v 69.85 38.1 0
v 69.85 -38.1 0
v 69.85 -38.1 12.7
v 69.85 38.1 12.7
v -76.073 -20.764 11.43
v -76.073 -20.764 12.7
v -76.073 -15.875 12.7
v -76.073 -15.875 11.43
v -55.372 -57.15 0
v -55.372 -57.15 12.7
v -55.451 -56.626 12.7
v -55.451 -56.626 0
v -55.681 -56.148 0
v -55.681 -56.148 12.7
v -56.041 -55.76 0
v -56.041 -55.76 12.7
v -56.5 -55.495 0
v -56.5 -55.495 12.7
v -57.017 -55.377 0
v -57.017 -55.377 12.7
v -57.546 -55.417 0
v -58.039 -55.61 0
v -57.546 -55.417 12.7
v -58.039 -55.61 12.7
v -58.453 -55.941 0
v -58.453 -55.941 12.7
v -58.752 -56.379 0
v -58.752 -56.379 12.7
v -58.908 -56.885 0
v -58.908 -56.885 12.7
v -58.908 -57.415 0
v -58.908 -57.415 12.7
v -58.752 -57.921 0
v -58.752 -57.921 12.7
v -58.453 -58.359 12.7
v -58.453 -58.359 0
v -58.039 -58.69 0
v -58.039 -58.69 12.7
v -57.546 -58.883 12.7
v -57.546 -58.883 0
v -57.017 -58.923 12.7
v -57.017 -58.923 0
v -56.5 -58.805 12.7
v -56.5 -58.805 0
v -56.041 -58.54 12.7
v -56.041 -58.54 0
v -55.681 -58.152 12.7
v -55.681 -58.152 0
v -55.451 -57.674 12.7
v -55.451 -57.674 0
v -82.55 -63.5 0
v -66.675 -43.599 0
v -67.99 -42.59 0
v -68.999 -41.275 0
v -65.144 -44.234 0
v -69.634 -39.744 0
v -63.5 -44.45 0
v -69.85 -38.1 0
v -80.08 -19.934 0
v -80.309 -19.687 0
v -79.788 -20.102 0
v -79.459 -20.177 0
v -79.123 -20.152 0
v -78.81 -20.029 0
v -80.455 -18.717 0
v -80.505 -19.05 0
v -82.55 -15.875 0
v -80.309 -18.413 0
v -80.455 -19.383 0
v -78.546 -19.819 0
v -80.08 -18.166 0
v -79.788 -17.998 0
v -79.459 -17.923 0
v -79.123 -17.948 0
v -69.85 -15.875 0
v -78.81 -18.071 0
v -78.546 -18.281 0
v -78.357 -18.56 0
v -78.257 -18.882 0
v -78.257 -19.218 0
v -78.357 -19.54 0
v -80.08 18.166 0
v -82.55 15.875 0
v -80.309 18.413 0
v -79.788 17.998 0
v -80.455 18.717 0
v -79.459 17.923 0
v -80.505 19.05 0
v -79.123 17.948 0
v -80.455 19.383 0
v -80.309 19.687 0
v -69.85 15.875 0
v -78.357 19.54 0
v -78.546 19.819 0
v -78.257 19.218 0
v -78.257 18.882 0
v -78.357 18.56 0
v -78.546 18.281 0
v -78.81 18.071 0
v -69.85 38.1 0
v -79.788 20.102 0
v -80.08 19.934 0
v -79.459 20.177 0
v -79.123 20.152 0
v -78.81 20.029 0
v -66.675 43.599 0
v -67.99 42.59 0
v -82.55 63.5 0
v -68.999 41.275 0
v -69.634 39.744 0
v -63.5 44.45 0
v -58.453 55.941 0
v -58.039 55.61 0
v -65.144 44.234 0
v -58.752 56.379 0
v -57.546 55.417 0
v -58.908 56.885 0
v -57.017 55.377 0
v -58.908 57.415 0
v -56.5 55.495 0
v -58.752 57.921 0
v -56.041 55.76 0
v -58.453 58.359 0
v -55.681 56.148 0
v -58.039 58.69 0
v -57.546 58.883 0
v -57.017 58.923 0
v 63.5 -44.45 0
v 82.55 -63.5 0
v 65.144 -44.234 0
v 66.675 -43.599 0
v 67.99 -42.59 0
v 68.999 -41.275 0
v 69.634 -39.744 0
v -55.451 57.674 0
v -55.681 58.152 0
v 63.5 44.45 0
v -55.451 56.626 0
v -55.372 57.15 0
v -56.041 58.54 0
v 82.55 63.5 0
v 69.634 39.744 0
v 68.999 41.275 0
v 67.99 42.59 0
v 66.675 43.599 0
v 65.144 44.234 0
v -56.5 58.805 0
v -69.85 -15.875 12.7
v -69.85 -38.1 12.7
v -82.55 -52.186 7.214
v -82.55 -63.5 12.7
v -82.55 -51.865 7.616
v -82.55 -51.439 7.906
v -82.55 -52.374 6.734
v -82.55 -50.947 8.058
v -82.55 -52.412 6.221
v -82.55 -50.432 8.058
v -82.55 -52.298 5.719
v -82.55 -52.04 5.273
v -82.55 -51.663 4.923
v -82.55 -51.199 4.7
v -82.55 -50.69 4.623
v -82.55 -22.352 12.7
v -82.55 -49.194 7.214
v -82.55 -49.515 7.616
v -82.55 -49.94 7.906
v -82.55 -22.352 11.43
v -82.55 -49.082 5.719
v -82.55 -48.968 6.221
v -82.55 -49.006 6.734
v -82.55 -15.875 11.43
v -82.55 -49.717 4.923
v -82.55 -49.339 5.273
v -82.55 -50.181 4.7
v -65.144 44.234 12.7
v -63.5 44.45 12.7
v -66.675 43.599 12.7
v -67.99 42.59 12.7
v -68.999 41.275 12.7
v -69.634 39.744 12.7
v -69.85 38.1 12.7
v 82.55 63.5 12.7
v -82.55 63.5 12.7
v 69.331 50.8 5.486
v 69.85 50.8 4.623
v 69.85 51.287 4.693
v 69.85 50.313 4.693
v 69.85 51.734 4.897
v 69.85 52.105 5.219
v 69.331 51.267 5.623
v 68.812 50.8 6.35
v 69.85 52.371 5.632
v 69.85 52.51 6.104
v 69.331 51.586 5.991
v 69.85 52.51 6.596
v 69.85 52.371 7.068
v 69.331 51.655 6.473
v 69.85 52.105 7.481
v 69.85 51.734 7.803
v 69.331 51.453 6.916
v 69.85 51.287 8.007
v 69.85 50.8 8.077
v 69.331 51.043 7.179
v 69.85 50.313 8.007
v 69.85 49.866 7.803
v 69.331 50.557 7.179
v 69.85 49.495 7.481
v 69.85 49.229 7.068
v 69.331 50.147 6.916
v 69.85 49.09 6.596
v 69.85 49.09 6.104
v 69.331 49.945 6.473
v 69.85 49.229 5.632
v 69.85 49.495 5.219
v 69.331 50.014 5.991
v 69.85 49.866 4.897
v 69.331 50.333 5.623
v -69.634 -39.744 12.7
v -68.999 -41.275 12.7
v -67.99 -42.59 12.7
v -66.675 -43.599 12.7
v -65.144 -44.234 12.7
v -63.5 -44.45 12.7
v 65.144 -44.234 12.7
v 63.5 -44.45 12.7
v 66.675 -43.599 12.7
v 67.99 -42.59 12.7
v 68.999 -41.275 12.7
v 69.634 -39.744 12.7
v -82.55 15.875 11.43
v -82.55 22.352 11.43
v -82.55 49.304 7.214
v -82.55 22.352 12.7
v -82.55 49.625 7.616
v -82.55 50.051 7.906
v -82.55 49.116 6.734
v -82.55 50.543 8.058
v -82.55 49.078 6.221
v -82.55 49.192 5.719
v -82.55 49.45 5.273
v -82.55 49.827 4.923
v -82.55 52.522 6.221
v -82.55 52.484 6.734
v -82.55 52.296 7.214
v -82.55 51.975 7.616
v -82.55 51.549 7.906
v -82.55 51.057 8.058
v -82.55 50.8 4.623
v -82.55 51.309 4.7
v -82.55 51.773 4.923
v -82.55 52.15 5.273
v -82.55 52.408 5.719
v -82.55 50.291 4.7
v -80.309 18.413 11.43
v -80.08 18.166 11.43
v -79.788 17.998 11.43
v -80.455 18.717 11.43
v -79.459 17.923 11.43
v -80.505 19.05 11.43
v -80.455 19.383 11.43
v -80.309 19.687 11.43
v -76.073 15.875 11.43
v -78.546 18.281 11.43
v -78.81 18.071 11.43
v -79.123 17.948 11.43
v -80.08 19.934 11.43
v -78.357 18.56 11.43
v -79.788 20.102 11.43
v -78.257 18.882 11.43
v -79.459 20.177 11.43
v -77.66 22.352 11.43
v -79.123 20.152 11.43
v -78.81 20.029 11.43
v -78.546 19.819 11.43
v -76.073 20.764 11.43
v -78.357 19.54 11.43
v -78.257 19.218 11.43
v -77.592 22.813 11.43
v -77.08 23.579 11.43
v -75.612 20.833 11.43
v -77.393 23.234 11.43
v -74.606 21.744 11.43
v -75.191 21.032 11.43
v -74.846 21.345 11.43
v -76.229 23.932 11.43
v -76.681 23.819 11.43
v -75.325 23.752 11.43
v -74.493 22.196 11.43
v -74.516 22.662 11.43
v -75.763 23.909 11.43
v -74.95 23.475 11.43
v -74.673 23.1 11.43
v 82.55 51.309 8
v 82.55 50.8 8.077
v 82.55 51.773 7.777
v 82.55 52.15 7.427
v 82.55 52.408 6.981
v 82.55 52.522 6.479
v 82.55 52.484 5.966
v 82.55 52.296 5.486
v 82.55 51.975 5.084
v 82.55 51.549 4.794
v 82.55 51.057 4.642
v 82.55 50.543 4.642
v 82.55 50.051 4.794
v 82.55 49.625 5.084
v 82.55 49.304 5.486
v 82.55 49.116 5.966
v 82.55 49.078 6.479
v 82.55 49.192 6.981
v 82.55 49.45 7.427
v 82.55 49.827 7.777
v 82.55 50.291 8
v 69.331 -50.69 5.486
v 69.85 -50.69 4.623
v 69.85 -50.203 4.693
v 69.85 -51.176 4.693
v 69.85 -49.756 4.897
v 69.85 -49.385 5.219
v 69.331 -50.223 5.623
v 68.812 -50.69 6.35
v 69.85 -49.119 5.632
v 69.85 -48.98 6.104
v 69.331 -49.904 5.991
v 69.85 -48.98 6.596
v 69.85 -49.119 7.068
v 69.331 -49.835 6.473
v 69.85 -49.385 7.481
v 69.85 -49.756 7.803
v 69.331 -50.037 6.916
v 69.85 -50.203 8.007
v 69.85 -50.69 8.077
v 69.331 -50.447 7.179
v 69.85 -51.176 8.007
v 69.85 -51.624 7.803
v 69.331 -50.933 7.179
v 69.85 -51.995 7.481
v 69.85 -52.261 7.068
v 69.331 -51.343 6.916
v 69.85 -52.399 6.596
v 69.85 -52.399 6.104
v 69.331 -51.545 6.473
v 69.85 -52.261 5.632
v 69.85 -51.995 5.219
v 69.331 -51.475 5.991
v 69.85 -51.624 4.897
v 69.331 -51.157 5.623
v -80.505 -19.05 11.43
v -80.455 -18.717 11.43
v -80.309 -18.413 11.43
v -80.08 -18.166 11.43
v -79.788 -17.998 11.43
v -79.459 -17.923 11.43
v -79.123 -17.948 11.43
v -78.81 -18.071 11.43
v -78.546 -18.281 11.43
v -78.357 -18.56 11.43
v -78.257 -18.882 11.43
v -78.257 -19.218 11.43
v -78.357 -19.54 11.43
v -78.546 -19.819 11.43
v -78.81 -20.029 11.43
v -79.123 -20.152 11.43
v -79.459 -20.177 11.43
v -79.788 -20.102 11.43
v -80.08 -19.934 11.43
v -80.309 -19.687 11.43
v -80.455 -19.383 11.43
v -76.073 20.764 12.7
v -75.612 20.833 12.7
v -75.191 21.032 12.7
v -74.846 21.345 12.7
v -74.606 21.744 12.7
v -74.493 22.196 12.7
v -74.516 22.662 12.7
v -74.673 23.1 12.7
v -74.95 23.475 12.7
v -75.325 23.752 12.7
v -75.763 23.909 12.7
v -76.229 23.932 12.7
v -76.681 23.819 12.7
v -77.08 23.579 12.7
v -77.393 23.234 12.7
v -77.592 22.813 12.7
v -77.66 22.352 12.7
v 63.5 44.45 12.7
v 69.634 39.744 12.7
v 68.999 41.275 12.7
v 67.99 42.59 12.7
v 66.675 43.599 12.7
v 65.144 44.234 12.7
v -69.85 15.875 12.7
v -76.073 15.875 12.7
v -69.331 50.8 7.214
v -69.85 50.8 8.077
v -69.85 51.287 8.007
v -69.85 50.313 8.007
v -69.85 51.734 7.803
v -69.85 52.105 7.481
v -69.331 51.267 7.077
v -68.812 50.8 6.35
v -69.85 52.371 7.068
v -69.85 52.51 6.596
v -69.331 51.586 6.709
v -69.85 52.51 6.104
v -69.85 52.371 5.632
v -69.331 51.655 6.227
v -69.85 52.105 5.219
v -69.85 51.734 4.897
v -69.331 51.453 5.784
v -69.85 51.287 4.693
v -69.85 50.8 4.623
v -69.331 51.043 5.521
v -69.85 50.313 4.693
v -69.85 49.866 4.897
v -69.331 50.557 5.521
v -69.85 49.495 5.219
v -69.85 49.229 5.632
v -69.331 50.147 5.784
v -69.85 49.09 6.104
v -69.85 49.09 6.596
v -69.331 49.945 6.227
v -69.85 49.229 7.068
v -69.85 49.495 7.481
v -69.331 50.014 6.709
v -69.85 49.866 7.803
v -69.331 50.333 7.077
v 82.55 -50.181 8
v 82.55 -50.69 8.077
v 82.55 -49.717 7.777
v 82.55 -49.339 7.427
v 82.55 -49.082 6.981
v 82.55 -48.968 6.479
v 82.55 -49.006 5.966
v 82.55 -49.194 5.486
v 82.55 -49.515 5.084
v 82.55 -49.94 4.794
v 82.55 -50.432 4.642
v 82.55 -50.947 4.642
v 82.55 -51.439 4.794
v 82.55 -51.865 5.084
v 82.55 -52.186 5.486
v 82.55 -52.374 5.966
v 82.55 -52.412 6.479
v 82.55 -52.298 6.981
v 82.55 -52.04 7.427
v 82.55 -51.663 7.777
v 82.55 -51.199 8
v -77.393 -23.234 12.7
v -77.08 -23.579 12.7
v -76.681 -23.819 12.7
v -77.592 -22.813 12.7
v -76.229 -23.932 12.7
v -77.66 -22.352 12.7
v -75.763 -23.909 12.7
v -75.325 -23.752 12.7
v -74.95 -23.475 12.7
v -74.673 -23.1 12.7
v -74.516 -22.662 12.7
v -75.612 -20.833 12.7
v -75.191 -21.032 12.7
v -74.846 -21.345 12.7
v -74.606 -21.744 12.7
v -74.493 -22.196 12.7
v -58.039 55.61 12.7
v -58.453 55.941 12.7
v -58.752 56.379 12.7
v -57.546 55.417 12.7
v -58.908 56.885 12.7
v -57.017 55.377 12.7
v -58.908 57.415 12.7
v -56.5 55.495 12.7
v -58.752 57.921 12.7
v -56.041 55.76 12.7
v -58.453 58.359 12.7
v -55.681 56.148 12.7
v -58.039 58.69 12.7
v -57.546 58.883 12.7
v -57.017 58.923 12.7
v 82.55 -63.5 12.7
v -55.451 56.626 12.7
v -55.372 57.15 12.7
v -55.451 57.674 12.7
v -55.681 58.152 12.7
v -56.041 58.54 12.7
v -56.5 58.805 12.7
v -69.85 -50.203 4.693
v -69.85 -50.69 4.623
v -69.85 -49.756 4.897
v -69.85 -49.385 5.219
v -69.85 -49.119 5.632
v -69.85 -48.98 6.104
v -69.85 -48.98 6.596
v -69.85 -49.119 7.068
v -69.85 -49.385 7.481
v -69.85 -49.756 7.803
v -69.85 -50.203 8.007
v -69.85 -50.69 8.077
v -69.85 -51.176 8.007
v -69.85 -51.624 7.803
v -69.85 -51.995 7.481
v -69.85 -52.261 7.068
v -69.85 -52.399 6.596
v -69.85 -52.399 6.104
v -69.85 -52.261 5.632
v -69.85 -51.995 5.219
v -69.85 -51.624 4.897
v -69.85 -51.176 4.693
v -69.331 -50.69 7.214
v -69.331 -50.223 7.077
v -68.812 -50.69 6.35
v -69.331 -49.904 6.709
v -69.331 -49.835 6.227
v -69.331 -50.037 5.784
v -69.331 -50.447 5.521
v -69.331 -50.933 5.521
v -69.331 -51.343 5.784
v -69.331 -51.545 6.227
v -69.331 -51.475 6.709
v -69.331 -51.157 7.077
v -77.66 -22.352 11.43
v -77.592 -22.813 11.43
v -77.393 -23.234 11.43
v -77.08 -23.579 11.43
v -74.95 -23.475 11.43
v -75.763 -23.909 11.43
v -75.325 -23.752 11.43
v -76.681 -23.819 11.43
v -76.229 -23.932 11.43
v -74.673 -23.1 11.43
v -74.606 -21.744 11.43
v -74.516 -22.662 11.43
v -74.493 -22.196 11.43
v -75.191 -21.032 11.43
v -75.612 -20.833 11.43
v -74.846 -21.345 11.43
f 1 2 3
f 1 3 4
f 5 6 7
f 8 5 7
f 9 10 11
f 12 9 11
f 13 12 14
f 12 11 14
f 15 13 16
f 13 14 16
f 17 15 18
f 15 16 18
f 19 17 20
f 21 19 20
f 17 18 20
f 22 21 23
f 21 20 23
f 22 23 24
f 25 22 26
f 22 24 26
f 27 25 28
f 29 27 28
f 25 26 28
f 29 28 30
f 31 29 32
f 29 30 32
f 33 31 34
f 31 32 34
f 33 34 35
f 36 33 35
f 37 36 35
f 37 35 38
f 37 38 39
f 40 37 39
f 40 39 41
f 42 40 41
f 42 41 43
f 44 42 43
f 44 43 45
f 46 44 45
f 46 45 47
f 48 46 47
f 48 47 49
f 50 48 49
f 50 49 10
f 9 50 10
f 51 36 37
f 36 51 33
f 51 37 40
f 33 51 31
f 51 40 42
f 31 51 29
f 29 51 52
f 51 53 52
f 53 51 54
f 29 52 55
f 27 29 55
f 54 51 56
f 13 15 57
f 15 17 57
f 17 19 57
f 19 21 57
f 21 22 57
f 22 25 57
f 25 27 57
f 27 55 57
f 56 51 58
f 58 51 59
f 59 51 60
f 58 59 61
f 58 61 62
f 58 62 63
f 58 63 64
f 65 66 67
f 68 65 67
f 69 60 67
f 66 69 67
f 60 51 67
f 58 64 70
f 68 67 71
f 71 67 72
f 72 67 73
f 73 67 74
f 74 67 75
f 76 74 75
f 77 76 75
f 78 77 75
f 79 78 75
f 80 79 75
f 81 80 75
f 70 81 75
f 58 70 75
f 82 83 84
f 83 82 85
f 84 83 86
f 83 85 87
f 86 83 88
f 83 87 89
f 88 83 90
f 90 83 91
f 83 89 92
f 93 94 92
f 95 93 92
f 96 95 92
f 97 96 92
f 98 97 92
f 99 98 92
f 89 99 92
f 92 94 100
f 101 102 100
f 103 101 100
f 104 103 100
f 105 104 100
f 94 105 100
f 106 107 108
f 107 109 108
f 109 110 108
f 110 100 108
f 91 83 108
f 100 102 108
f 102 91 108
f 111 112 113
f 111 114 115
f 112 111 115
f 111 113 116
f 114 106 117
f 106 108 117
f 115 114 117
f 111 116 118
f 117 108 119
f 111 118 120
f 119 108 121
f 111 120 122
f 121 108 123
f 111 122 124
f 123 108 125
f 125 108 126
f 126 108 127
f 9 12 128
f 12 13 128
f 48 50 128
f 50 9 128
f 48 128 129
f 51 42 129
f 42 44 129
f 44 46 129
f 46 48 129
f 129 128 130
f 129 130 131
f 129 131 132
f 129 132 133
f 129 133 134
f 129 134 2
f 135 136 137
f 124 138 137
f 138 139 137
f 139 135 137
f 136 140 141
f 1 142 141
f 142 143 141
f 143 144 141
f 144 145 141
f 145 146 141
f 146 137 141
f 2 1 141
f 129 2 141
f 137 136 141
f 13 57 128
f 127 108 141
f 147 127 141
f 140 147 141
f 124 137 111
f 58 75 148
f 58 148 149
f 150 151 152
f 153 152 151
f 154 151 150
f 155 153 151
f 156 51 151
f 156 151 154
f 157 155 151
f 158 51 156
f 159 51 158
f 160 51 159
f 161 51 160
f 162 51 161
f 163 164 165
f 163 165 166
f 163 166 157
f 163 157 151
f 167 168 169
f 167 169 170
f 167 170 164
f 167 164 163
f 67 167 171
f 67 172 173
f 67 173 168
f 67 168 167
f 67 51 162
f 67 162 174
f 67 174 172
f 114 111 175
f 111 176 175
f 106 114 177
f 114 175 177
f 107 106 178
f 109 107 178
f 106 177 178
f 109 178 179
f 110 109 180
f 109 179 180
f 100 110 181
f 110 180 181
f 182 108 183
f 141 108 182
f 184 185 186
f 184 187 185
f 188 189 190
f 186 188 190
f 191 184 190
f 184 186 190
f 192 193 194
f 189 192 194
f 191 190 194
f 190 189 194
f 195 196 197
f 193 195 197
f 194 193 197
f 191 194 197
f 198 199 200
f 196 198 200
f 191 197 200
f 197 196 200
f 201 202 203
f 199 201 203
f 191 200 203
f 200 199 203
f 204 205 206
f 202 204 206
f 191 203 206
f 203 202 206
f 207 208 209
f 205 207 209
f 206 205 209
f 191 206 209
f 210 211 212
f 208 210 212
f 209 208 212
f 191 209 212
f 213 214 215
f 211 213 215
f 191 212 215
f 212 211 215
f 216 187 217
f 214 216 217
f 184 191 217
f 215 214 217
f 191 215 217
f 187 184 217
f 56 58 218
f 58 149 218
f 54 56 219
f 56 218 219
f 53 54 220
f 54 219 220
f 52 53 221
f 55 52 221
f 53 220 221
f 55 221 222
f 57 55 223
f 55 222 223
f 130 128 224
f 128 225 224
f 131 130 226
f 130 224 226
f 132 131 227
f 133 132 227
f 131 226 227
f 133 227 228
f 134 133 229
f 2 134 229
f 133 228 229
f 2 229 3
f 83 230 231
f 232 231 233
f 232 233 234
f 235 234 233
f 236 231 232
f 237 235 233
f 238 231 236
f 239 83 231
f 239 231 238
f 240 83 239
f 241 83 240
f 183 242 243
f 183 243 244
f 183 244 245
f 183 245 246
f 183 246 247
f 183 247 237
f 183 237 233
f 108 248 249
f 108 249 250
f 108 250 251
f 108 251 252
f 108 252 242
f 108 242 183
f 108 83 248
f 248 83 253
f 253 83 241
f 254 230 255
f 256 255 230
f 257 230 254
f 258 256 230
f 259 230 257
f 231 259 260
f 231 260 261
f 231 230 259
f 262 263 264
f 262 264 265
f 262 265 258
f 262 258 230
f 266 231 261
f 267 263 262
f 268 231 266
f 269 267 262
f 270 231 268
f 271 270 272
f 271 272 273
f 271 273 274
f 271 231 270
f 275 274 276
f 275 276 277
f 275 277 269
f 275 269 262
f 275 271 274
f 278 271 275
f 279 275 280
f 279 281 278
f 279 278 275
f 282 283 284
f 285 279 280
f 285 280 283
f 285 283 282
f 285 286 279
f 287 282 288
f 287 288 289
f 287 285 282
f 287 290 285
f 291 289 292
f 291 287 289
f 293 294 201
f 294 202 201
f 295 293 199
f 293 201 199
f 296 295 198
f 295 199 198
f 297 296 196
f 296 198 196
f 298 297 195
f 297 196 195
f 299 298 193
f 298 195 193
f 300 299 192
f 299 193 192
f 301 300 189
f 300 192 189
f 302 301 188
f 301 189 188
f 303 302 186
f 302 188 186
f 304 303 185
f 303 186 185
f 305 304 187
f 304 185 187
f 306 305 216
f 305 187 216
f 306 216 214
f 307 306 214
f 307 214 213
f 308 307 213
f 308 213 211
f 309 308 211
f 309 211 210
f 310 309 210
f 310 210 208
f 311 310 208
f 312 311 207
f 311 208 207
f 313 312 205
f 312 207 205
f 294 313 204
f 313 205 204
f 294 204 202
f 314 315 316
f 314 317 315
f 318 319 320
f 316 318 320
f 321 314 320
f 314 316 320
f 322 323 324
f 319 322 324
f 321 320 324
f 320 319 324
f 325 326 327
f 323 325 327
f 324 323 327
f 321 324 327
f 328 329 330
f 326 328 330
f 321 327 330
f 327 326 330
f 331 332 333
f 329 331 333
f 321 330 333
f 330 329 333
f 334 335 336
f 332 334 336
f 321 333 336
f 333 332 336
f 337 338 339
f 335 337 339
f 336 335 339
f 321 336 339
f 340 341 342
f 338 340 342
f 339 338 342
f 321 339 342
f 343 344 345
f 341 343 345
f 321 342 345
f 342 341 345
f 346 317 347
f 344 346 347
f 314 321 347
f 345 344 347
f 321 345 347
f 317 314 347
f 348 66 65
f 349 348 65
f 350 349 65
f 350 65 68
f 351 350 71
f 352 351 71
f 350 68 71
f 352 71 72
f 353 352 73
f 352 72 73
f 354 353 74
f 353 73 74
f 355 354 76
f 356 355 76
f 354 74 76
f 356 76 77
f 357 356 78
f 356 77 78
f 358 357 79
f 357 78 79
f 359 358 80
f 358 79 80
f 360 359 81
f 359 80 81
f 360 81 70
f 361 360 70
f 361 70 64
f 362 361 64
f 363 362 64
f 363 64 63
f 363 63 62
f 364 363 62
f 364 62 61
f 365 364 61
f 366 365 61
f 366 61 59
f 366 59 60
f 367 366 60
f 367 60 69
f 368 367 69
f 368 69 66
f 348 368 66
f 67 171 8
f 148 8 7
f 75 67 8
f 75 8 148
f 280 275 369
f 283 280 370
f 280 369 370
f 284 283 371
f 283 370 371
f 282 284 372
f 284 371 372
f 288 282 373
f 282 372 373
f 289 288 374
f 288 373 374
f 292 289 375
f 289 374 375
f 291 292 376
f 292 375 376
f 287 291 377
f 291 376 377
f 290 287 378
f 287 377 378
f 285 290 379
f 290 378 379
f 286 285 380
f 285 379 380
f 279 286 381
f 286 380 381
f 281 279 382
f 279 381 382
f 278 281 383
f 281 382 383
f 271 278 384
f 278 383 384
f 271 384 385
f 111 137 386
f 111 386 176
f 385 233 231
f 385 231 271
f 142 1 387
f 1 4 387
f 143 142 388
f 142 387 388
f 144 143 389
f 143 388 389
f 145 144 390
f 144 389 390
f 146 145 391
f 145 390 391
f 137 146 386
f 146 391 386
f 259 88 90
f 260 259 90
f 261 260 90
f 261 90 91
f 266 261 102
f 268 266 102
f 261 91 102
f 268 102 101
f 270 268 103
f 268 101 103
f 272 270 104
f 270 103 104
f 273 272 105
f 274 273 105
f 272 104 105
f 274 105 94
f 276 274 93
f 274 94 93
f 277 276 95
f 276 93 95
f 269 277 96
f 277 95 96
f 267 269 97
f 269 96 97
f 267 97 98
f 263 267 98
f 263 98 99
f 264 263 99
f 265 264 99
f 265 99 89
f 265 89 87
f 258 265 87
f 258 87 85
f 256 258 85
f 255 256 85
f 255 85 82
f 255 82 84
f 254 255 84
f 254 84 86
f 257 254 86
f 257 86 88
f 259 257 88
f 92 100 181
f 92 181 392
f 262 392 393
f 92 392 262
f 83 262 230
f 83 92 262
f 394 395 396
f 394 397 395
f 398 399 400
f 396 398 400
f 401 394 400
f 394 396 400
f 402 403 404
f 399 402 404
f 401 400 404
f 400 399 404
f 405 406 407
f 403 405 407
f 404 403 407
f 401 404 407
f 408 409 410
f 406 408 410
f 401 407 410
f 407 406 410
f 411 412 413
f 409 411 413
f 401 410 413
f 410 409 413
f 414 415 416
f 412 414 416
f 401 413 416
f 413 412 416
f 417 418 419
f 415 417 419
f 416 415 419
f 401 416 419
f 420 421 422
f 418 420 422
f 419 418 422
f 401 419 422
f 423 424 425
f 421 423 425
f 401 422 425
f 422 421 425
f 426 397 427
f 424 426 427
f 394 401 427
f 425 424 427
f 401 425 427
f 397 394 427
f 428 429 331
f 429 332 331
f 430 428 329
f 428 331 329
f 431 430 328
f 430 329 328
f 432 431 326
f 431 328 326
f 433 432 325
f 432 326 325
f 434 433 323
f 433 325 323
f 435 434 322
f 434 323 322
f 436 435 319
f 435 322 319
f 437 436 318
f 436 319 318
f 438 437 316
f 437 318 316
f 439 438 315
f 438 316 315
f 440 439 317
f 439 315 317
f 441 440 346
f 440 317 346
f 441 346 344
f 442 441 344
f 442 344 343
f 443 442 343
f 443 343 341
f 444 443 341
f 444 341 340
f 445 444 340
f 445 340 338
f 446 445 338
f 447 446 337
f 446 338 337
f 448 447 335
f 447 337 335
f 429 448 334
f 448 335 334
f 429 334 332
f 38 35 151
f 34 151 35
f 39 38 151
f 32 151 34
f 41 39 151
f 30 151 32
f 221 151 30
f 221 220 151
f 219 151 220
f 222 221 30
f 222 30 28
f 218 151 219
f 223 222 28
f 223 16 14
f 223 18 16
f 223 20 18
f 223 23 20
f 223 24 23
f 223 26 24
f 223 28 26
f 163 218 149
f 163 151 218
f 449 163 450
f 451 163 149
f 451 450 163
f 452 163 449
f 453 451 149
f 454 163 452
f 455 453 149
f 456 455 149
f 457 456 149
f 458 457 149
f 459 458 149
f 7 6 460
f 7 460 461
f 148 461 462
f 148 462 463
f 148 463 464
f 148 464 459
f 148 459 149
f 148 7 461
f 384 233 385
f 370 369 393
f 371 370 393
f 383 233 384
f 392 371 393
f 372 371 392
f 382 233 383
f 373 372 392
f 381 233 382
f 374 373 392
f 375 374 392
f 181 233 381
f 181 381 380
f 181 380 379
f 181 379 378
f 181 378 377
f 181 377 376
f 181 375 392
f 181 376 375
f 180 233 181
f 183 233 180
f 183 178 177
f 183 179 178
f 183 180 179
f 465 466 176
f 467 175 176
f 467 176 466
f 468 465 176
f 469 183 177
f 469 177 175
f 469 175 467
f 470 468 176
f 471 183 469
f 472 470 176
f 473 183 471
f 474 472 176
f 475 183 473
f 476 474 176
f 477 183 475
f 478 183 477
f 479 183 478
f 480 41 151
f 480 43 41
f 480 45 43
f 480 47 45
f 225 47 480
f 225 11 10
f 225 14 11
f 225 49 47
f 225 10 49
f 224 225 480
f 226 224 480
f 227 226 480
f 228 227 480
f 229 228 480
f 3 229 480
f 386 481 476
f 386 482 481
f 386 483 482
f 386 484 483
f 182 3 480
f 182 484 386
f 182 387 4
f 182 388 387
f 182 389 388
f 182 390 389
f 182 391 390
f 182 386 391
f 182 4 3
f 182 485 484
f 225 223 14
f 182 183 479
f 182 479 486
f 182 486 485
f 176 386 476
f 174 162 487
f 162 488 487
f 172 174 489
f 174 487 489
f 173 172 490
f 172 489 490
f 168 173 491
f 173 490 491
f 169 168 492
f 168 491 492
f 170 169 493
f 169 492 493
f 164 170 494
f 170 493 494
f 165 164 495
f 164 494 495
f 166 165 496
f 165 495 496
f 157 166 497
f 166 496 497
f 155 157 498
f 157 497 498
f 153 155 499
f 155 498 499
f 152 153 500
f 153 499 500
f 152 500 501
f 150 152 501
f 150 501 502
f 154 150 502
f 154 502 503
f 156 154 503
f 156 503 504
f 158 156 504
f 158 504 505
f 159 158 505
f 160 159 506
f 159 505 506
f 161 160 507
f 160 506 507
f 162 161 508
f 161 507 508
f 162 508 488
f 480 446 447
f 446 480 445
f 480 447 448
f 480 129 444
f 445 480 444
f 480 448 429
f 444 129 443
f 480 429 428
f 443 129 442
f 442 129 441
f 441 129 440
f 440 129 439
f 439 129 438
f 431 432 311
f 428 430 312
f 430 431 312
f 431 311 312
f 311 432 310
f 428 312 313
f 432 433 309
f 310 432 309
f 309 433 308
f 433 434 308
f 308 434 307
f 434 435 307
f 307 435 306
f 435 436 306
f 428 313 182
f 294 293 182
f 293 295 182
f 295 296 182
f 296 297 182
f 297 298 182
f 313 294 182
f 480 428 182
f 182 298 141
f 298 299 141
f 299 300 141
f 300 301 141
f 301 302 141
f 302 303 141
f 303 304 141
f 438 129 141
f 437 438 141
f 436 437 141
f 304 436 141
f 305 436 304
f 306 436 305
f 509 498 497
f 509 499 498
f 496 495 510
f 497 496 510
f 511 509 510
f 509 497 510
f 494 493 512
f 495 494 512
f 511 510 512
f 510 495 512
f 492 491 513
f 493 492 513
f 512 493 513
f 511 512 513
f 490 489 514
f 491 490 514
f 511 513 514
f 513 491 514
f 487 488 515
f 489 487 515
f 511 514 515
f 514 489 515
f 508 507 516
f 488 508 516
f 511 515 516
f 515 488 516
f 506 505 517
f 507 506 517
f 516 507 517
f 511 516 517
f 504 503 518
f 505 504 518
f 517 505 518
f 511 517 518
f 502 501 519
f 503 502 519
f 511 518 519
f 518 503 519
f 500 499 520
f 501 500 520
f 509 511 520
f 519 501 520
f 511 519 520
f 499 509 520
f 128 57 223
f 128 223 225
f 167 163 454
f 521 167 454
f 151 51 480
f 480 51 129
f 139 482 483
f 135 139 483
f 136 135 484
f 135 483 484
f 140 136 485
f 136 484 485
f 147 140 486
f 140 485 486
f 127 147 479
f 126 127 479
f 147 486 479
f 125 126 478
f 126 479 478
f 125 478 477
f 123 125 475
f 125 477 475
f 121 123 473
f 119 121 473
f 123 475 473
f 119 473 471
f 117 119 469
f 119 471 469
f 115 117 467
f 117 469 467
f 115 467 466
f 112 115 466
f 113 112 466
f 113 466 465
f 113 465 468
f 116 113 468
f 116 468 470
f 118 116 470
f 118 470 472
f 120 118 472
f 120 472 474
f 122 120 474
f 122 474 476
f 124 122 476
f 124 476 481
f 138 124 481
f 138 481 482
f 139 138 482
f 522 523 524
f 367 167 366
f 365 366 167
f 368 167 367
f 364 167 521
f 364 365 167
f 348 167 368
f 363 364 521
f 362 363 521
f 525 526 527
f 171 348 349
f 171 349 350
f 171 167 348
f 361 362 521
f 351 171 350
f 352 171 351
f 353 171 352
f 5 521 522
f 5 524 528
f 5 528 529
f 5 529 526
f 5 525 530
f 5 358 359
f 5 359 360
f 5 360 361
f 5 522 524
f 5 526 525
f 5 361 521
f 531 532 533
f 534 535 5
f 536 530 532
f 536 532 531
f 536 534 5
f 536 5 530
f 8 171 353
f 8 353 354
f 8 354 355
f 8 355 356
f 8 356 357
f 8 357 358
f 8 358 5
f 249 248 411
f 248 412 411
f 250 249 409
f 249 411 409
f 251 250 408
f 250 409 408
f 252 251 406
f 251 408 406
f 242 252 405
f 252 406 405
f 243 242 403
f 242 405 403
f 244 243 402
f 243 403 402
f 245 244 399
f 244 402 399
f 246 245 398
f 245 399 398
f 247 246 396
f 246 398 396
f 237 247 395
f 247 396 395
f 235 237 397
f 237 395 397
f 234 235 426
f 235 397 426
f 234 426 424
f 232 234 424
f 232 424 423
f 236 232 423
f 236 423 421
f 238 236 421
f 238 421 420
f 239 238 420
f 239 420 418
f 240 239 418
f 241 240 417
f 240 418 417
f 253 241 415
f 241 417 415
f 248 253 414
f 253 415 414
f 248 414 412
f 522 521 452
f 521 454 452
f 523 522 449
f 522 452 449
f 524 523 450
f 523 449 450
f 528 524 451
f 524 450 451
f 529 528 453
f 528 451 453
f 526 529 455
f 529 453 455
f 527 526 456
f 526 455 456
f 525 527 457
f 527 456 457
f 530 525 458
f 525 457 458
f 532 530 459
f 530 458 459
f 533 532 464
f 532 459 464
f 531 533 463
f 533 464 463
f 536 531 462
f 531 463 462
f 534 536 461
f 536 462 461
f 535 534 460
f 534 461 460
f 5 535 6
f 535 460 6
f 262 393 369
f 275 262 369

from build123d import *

# Parameters (mm, degrees)
SKETCH1_W                 = 165.1
SKETCH1_H                 = 127
BOSS_EXTRUDE1_DEPTH       = 12.7
CUT_EXTRUDE1_DEPTH        = 105.919218926
SKETCH3_W                 = 6.477
SKETCH3_H                 = 6.477
CUT_EXTRUDE2_DEPTH        = 1.27
SKETCH4_W                 = 6.477
SKETCH4_H                 = 6.477
CUT_EXTRUDE3_DEPTH        = 1.27
F_8_32_TAPPED_HOLE1_D     = 3.4544
F_8_32_TAPPED_HOLE1_DEPTH = 12.7
F_8_32_TAPPED_HOLE1_TIP   = 1.037806461
F_8_32_TAPPED_HOLE2_D     = 3.4544
F_8_32_TAPPED_HOLE2_DEPTH = 12.7
F_8_32_TAPPED_HOLE2_TIP   = 1.037806461
F_8_32_TAPPED_HOLE3_D     = 3.4544
F_8_32_TAPPED_HOLE3_DEPTH = 12.7
F_8_32_TAPPED_HOLE3_TIP   = 1.037806461
F_8_32_TAPPED_HOLE4_D     = 3.4544
F_8_32_TAPPED_HOLE4_DEPTH = 12.7
F_8_32_TAPPED_HOLE4_TIP   = 1.037806461
F_4_40_TAPPED_HOLE1_D     = 2.2606
F_4_40_TAPPED_HOLE2_D     = 2.2606
SKETCH20_R                = 1.778
CUT_EXTRUDE4_DEPTH        = 105.919218926
SKETCH21_R                = 1.778
CUT_EXTRUDE5_DEPTH        = 105.919218926
FILLET4_R                 = 6.35
FILLET5_R                 = 6.35
SKETCH24_R                = 1.5875
CUT_EXTRUDE6_DEPTH        = 1.27


with BuildPart() as part:
    # Sketch1 → Boss-Extrude1 (new body)
    with BuildSketch(Plane.XY):
        Rectangle(SKETCH1_W, SKETCH1_H)
    extrude(amount=BOSS_EXTRUDE1_DEPTH)

    # Sketch2 → Cut-Extrude1 (cut, through all)
    with BuildSketch(Plane.XY):
        Polygon((-82.55, -15.875), (-69.85, -15.875), (-69.85, -44.45), (69.85, -44.45), (69.85, 44.45), (-69.85, 44.45), (-69.85, 15.875), (-82.55, 15.875), align=None)
    extrude(amount=CUT_EXTRUDE1_DEPTH, mode=Mode.SUBTRACT)

    # Sketch3 → Cut-Extrude2 (cut)
    with BuildSketch(Plane.XY.offset(12.7)):
        with Locations((-79.3115, 19.1135)):
            Rectangle(SKETCH3_W, SKETCH3_H)
    extrude(amount=-CUT_EXTRUDE2_DEPTH, mode=Mode.SUBTRACT)

    # Sketch4 → Cut-Extrude3 (cut)
    with BuildSketch(Plane.XY.offset(12.7)):
        with Locations((-79.3115, -19.1135)):
            Rectangle(SKETCH4_W, SKETCH4_H)
    extrude(amount=-CUT_EXTRUDE3_DEPTH, mode=Mode.SUBTRACT)

    # #8-32 Tapped Hole1
    with Locations(Plane.ZY.offset(82.55)):
        with Locations((6.35, 50.8)):
            Hole(F_8_32_TAPPED_HOLE1_D / 2, depth=F_8_32_TAPPED_HOLE1_DEPTH)
            with Locations((0, 0, -(F_8_32_TAPPED_HOLE1_DEPTH + F_8_32_TAPPED_HOLE1_TIP / 2))):  # 118° drill point
                Cone(0, F_8_32_TAPPED_HOLE1_D / 2, F_8_32_TAPPED_HOLE1_TIP, mode=Mode.SUBTRACT)

    # #8-32 Tapped Hole2
    with Locations(Plane.ZY.offset(82.55)):
        with Locations((6.35, -50.689875403)):
            Hole(F_8_32_TAPPED_HOLE2_D / 2, depth=F_8_32_TAPPED_HOLE2_DEPTH)
            with Locations((0, 0, -(F_8_32_TAPPED_HOLE2_DEPTH + F_8_32_TAPPED_HOLE2_TIP / 2))):  # 118° drill point
                Cone(0, F_8_32_TAPPED_HOLE2_D / 2, F_8_32_TAPPED_HOLE2_TIP, mode=Mode.SUBTRACT)

    # #8-32 Tapped Hole3
    with Locations(Plane(origin=(82.55, 0, 0), x_dir=(0, 0, -1), z_dir=(1, 0, 0))):
        with Locations((-6.35, 50.8)):
            Hole(F_8_32_TAPPED_HOLE3_D / 2, depth=F_8_32_TAPPED_HOLE3_DEPTH)
            with Locations((0, 0, -(F_8_32_TAPPED_HOLE3_DEPTH + F_8_32_TAPPED_HOLE3_TIP / 2))):  # 118° drill point
                Cone(0, F_8_32_TAPPED_HOLE3_D / 2, F_8_32_TAPPED_HOLE3_TIP, mode=Mode.SUBTRACT)

    # #8-32 Tapped Hole4
    with Locations(Plane(origin=(82.55, 0, 0), x_dir=(0, 0, -1), z_dir=(1, 0, 0))):
        with Locations((-6.35, -50.689875403)):
            Hole(F_8_32_TAPPED_HOLE4_D / 2, depth=F_8_32_TAPPED_HOLE4_DEPTH)
            with Locations((0, 0, -(F_8_32_TAPPED_HOLE4_DEPTH + F_8_32_TAPPED_HOLE4_TIP / 2))):  # 118° drill point
                Cone(0, F_8_32_TAPPED_HOLE4_D / 2, F_8_32_TAPPED_HOLE4_TIP, mode=Mode.SUBTRACT)

    # #4-40 Tapped Hole1 (through all)
    with Locations(Plane.XY.offset(11.43)):
        with Locations((-79.375, 19.05)):
            Hole(F_4_40_TAPPED_HOLE1_D / 2)

    # #4-40 Tapped Hole2 (through all)
    with Locations(Plane.XY.offset(11.43)):
        with Locations((-79.375, -19.05)):
            Hole(F_4_40_TAPPED_HOLE2_D / 2)

    # Sketch20 → Cut-Extrude4 (cut, through all)
    with BuildSketch(Plane.XY.offset(12.7)):
        with Locations((-57.15, -57.15)):
            Circle(SKETCH20_R)
    extrude(amount=-CUT_EXTRUDE4_DEPTH, mode=Mode.SUBTRACT)

    # Sketch21 → Cut-Extrude5 (cut, through all)
    with BuildSketch(Plane.XY.offset(12.7)):
        with Locations((-57.15, 57.15)):
            Circle(SKETCH21_R)
    extrude(amount=-CUT_EXTRUDE5_DEPTH, mode=Mode.SUBTRACT)

    # Fillet4
    fillet4_edges = [part.edges().sort_by_distance(p)[0] for p in [
        (-69.85, -44.45, 6.35),
    ]]
    fillet(fillet4_edges, radius=FILLET4_R)

    # Fillet5
    fillet5_edges = [part.edges().sort_by_distance(p)[0] for p in [
        (69.85, -44.45, 6.35),
        (69.85, 44.45, 6.35),
        (-69.85, 44.45, 6.35),
    ]]
    fillet(fillet5_edges, radius=FILLET5_R)

    # Sketch24 → Cut-Extrude6 (cut)
    with BuildSketch(Plane.XY.offset(12.7)):
        with Locations((-76.073, -22.352)):
            Circle(SKETCH24_R)
        with Locations((-76.073, 22.352)):
            Circle(SKETCH24_R)
    extrude(amount=-CUT_EXTRUDE6_DEPTH, mode=Mode.SUBTRACT)


solid = part.part
